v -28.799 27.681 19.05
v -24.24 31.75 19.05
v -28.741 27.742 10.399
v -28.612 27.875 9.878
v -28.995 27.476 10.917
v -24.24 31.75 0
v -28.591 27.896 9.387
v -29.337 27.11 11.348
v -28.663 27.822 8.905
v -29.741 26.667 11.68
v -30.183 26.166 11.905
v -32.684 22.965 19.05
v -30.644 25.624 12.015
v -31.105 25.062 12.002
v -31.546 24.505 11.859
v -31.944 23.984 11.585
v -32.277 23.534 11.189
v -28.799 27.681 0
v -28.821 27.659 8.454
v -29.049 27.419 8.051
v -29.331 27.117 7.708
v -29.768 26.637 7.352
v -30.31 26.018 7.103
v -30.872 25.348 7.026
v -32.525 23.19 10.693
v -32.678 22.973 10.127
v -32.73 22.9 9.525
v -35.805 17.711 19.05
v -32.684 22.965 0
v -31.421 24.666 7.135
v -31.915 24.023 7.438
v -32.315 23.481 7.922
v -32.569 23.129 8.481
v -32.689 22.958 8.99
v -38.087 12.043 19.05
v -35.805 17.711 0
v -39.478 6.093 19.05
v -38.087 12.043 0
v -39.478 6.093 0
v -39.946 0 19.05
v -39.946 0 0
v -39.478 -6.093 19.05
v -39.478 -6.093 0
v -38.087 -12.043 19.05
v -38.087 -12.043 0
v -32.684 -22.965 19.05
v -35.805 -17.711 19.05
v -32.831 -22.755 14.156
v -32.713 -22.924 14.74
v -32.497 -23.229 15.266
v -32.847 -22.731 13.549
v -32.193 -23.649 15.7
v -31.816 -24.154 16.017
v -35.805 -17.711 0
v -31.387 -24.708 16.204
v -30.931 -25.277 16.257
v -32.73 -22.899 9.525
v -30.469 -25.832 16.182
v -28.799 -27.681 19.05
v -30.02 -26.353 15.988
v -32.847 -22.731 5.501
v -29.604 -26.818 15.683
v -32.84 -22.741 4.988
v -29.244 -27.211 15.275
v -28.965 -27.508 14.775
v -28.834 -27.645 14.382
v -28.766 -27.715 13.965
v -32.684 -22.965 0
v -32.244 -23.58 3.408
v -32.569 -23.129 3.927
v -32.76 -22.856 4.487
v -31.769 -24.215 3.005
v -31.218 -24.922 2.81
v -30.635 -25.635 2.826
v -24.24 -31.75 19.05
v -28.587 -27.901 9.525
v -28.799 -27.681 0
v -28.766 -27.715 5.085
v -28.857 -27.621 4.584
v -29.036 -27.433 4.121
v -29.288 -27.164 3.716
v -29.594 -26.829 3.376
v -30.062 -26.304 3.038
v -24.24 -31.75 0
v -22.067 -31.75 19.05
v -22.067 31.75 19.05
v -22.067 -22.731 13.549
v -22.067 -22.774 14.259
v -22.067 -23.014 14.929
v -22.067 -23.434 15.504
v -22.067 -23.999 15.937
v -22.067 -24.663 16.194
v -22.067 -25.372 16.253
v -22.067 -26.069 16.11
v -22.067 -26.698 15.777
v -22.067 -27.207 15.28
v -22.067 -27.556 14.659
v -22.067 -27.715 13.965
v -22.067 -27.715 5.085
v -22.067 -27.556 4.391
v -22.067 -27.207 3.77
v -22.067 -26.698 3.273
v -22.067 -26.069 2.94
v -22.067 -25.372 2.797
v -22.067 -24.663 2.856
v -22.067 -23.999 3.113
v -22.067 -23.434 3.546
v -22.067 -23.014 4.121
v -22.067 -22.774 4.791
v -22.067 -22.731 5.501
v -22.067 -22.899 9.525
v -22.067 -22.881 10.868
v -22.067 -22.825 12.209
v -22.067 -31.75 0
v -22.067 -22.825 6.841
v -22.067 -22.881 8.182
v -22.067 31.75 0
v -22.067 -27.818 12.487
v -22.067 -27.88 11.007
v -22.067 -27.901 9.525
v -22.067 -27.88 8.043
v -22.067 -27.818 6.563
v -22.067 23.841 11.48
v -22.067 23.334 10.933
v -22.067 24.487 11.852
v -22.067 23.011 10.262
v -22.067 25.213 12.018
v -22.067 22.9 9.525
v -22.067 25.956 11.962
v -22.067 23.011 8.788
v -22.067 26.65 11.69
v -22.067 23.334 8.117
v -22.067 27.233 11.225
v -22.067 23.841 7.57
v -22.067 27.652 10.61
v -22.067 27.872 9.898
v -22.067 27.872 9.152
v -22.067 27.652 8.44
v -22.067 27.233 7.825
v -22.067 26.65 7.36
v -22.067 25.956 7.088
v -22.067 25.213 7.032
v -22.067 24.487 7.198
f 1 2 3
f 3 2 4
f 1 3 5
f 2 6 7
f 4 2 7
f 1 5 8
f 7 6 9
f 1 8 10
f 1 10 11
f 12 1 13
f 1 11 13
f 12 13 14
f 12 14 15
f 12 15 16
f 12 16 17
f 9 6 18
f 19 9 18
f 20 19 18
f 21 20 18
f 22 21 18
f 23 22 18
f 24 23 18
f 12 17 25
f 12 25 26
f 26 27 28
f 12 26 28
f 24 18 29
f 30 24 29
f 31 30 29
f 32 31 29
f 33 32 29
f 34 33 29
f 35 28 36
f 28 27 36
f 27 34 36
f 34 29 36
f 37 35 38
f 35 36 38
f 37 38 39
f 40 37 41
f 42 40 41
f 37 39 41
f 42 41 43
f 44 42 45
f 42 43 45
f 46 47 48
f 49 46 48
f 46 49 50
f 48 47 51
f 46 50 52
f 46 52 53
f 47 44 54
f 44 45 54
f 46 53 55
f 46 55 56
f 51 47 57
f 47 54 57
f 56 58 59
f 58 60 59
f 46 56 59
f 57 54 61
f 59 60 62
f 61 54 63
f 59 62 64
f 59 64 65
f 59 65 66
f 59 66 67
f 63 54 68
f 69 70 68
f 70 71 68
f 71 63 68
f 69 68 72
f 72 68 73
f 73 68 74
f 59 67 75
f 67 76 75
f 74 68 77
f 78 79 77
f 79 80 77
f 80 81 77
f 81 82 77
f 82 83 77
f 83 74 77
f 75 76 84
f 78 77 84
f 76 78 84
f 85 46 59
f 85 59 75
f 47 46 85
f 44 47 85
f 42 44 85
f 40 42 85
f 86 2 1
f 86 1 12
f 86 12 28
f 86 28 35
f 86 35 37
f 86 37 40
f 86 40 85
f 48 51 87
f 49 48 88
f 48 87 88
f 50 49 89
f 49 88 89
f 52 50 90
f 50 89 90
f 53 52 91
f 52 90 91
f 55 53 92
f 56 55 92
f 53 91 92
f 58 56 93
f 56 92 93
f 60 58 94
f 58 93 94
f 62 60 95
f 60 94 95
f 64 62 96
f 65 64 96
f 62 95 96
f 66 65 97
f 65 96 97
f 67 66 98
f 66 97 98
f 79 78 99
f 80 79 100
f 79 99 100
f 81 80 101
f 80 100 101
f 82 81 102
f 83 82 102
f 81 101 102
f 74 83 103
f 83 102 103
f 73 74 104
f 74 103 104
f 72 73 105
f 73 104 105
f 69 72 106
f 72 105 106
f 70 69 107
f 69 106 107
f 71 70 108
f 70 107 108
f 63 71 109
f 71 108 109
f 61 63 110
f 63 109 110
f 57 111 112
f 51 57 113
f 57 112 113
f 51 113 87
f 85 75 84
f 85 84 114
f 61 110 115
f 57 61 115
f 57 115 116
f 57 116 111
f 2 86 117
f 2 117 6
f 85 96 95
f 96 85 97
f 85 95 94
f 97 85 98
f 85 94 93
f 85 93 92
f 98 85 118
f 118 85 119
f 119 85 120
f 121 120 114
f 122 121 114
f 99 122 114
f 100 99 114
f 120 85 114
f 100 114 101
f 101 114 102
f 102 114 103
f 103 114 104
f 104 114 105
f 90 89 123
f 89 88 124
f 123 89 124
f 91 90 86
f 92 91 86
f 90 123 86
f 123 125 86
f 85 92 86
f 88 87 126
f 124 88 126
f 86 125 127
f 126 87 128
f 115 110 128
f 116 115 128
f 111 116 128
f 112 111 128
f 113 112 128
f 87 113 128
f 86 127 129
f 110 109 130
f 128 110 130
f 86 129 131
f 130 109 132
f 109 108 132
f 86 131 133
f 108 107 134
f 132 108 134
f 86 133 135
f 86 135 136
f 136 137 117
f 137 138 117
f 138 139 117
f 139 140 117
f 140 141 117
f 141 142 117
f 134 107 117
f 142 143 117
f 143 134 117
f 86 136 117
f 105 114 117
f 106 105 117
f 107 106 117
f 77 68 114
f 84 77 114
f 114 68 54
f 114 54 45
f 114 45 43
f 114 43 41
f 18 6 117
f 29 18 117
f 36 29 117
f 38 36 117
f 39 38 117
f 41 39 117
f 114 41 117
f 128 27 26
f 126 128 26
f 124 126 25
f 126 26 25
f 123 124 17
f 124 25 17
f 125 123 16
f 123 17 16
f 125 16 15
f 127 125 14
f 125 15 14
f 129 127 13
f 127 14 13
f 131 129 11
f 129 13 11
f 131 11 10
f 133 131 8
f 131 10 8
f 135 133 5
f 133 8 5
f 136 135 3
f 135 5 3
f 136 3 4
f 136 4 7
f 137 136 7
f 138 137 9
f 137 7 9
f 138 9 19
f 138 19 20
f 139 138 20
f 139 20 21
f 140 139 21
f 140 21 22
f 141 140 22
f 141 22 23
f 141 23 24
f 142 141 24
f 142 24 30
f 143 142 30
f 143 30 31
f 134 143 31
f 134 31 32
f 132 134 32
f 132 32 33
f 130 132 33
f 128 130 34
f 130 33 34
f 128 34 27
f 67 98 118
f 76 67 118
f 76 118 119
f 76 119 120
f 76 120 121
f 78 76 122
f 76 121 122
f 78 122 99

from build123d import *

# Parameters (mm, degrees)
F1_DEPTH = 19.05
F3_DEPTH = 25.4
F4_D     = 5
F4_DEPTH = 15.6972
F4_TIP   = 1.5021515476


with BuildPart() as f1:
    # F0 (on Top) → F1 (new body)
    with BuildSketch(Plane.XY):
        with BuildLine():
            Line((-22.0673531294, 31.75), (-24.2402065279, 31.75))
            ThreePointArc((-24.2402065279, 31.75), (-39.9455894, 0), (-24.2402065279, -31.75))
            Line((-24.2402065279, -31.75), (-22.0673531294, -31.75))
            Line((-22.0673531294, -31.75), (-22.0673531294, 31.75))
        make_face()
    extrude(amount=F1_DEPTH)

    # F2 (on face) → F3 (cut)
    with BuildSketch(Plane.YZ.offset(-22.0673531294)):
        with BuildLine():
            ThreePointArc((-27.7153407028, 13.9654662391), (-27.8542875294, 11.747165191), (-27.90063, 9.525))
            Line((-27.90063, 9.525), (-22.89937, 9.525))
            ThreePointArc((-22.89937, 9.525), (-22.8573758972, 11.538656851), (-22.7314666127, 13.5488121361))
            ThreePointArc((-22.7314666127, 13.5488121361), (-25.0150766063, 16.2490762326), (-27.7153407028, 13.9654662391))
        make_face()
        with BuildLine():
            Line((-22.89937, 9.525), (-27.90063, 9.525))
            ThreePointArc((-27.90063, 9.525), (-27.8542875294, 7.302834809), (-27.7153407028, 5.0845337609))
            ThreePointArc((-27.7153407028, 5.0845337609), (-25.0150766063, 2.8009237674), (-22.7314666127, 5.5011878639))
            ThreePointArc((-22.7314666127, 5.5011878639), (-22.8573758972, 7.511343149), (-22.89937, 9.525))
        make_face()
    extrude(amount=-F3_DEPTH, mode=Mode.SUBTRACT)

    # F4
    with Locations(Plane.YZ.offset(-22.0673531294)):
        with Locations((25.4, 9.525)):
            Hole(F4_D / 2, depth=F4_DEPTH)
            with Locations((0, 0, -(F4_DEPTH + F4_TIP / 2))):  # 118° drill point
                Cone(0, F4_D / 2, F4_TIP, mode=Mode.SUBTRACT)


solid = f1.part
